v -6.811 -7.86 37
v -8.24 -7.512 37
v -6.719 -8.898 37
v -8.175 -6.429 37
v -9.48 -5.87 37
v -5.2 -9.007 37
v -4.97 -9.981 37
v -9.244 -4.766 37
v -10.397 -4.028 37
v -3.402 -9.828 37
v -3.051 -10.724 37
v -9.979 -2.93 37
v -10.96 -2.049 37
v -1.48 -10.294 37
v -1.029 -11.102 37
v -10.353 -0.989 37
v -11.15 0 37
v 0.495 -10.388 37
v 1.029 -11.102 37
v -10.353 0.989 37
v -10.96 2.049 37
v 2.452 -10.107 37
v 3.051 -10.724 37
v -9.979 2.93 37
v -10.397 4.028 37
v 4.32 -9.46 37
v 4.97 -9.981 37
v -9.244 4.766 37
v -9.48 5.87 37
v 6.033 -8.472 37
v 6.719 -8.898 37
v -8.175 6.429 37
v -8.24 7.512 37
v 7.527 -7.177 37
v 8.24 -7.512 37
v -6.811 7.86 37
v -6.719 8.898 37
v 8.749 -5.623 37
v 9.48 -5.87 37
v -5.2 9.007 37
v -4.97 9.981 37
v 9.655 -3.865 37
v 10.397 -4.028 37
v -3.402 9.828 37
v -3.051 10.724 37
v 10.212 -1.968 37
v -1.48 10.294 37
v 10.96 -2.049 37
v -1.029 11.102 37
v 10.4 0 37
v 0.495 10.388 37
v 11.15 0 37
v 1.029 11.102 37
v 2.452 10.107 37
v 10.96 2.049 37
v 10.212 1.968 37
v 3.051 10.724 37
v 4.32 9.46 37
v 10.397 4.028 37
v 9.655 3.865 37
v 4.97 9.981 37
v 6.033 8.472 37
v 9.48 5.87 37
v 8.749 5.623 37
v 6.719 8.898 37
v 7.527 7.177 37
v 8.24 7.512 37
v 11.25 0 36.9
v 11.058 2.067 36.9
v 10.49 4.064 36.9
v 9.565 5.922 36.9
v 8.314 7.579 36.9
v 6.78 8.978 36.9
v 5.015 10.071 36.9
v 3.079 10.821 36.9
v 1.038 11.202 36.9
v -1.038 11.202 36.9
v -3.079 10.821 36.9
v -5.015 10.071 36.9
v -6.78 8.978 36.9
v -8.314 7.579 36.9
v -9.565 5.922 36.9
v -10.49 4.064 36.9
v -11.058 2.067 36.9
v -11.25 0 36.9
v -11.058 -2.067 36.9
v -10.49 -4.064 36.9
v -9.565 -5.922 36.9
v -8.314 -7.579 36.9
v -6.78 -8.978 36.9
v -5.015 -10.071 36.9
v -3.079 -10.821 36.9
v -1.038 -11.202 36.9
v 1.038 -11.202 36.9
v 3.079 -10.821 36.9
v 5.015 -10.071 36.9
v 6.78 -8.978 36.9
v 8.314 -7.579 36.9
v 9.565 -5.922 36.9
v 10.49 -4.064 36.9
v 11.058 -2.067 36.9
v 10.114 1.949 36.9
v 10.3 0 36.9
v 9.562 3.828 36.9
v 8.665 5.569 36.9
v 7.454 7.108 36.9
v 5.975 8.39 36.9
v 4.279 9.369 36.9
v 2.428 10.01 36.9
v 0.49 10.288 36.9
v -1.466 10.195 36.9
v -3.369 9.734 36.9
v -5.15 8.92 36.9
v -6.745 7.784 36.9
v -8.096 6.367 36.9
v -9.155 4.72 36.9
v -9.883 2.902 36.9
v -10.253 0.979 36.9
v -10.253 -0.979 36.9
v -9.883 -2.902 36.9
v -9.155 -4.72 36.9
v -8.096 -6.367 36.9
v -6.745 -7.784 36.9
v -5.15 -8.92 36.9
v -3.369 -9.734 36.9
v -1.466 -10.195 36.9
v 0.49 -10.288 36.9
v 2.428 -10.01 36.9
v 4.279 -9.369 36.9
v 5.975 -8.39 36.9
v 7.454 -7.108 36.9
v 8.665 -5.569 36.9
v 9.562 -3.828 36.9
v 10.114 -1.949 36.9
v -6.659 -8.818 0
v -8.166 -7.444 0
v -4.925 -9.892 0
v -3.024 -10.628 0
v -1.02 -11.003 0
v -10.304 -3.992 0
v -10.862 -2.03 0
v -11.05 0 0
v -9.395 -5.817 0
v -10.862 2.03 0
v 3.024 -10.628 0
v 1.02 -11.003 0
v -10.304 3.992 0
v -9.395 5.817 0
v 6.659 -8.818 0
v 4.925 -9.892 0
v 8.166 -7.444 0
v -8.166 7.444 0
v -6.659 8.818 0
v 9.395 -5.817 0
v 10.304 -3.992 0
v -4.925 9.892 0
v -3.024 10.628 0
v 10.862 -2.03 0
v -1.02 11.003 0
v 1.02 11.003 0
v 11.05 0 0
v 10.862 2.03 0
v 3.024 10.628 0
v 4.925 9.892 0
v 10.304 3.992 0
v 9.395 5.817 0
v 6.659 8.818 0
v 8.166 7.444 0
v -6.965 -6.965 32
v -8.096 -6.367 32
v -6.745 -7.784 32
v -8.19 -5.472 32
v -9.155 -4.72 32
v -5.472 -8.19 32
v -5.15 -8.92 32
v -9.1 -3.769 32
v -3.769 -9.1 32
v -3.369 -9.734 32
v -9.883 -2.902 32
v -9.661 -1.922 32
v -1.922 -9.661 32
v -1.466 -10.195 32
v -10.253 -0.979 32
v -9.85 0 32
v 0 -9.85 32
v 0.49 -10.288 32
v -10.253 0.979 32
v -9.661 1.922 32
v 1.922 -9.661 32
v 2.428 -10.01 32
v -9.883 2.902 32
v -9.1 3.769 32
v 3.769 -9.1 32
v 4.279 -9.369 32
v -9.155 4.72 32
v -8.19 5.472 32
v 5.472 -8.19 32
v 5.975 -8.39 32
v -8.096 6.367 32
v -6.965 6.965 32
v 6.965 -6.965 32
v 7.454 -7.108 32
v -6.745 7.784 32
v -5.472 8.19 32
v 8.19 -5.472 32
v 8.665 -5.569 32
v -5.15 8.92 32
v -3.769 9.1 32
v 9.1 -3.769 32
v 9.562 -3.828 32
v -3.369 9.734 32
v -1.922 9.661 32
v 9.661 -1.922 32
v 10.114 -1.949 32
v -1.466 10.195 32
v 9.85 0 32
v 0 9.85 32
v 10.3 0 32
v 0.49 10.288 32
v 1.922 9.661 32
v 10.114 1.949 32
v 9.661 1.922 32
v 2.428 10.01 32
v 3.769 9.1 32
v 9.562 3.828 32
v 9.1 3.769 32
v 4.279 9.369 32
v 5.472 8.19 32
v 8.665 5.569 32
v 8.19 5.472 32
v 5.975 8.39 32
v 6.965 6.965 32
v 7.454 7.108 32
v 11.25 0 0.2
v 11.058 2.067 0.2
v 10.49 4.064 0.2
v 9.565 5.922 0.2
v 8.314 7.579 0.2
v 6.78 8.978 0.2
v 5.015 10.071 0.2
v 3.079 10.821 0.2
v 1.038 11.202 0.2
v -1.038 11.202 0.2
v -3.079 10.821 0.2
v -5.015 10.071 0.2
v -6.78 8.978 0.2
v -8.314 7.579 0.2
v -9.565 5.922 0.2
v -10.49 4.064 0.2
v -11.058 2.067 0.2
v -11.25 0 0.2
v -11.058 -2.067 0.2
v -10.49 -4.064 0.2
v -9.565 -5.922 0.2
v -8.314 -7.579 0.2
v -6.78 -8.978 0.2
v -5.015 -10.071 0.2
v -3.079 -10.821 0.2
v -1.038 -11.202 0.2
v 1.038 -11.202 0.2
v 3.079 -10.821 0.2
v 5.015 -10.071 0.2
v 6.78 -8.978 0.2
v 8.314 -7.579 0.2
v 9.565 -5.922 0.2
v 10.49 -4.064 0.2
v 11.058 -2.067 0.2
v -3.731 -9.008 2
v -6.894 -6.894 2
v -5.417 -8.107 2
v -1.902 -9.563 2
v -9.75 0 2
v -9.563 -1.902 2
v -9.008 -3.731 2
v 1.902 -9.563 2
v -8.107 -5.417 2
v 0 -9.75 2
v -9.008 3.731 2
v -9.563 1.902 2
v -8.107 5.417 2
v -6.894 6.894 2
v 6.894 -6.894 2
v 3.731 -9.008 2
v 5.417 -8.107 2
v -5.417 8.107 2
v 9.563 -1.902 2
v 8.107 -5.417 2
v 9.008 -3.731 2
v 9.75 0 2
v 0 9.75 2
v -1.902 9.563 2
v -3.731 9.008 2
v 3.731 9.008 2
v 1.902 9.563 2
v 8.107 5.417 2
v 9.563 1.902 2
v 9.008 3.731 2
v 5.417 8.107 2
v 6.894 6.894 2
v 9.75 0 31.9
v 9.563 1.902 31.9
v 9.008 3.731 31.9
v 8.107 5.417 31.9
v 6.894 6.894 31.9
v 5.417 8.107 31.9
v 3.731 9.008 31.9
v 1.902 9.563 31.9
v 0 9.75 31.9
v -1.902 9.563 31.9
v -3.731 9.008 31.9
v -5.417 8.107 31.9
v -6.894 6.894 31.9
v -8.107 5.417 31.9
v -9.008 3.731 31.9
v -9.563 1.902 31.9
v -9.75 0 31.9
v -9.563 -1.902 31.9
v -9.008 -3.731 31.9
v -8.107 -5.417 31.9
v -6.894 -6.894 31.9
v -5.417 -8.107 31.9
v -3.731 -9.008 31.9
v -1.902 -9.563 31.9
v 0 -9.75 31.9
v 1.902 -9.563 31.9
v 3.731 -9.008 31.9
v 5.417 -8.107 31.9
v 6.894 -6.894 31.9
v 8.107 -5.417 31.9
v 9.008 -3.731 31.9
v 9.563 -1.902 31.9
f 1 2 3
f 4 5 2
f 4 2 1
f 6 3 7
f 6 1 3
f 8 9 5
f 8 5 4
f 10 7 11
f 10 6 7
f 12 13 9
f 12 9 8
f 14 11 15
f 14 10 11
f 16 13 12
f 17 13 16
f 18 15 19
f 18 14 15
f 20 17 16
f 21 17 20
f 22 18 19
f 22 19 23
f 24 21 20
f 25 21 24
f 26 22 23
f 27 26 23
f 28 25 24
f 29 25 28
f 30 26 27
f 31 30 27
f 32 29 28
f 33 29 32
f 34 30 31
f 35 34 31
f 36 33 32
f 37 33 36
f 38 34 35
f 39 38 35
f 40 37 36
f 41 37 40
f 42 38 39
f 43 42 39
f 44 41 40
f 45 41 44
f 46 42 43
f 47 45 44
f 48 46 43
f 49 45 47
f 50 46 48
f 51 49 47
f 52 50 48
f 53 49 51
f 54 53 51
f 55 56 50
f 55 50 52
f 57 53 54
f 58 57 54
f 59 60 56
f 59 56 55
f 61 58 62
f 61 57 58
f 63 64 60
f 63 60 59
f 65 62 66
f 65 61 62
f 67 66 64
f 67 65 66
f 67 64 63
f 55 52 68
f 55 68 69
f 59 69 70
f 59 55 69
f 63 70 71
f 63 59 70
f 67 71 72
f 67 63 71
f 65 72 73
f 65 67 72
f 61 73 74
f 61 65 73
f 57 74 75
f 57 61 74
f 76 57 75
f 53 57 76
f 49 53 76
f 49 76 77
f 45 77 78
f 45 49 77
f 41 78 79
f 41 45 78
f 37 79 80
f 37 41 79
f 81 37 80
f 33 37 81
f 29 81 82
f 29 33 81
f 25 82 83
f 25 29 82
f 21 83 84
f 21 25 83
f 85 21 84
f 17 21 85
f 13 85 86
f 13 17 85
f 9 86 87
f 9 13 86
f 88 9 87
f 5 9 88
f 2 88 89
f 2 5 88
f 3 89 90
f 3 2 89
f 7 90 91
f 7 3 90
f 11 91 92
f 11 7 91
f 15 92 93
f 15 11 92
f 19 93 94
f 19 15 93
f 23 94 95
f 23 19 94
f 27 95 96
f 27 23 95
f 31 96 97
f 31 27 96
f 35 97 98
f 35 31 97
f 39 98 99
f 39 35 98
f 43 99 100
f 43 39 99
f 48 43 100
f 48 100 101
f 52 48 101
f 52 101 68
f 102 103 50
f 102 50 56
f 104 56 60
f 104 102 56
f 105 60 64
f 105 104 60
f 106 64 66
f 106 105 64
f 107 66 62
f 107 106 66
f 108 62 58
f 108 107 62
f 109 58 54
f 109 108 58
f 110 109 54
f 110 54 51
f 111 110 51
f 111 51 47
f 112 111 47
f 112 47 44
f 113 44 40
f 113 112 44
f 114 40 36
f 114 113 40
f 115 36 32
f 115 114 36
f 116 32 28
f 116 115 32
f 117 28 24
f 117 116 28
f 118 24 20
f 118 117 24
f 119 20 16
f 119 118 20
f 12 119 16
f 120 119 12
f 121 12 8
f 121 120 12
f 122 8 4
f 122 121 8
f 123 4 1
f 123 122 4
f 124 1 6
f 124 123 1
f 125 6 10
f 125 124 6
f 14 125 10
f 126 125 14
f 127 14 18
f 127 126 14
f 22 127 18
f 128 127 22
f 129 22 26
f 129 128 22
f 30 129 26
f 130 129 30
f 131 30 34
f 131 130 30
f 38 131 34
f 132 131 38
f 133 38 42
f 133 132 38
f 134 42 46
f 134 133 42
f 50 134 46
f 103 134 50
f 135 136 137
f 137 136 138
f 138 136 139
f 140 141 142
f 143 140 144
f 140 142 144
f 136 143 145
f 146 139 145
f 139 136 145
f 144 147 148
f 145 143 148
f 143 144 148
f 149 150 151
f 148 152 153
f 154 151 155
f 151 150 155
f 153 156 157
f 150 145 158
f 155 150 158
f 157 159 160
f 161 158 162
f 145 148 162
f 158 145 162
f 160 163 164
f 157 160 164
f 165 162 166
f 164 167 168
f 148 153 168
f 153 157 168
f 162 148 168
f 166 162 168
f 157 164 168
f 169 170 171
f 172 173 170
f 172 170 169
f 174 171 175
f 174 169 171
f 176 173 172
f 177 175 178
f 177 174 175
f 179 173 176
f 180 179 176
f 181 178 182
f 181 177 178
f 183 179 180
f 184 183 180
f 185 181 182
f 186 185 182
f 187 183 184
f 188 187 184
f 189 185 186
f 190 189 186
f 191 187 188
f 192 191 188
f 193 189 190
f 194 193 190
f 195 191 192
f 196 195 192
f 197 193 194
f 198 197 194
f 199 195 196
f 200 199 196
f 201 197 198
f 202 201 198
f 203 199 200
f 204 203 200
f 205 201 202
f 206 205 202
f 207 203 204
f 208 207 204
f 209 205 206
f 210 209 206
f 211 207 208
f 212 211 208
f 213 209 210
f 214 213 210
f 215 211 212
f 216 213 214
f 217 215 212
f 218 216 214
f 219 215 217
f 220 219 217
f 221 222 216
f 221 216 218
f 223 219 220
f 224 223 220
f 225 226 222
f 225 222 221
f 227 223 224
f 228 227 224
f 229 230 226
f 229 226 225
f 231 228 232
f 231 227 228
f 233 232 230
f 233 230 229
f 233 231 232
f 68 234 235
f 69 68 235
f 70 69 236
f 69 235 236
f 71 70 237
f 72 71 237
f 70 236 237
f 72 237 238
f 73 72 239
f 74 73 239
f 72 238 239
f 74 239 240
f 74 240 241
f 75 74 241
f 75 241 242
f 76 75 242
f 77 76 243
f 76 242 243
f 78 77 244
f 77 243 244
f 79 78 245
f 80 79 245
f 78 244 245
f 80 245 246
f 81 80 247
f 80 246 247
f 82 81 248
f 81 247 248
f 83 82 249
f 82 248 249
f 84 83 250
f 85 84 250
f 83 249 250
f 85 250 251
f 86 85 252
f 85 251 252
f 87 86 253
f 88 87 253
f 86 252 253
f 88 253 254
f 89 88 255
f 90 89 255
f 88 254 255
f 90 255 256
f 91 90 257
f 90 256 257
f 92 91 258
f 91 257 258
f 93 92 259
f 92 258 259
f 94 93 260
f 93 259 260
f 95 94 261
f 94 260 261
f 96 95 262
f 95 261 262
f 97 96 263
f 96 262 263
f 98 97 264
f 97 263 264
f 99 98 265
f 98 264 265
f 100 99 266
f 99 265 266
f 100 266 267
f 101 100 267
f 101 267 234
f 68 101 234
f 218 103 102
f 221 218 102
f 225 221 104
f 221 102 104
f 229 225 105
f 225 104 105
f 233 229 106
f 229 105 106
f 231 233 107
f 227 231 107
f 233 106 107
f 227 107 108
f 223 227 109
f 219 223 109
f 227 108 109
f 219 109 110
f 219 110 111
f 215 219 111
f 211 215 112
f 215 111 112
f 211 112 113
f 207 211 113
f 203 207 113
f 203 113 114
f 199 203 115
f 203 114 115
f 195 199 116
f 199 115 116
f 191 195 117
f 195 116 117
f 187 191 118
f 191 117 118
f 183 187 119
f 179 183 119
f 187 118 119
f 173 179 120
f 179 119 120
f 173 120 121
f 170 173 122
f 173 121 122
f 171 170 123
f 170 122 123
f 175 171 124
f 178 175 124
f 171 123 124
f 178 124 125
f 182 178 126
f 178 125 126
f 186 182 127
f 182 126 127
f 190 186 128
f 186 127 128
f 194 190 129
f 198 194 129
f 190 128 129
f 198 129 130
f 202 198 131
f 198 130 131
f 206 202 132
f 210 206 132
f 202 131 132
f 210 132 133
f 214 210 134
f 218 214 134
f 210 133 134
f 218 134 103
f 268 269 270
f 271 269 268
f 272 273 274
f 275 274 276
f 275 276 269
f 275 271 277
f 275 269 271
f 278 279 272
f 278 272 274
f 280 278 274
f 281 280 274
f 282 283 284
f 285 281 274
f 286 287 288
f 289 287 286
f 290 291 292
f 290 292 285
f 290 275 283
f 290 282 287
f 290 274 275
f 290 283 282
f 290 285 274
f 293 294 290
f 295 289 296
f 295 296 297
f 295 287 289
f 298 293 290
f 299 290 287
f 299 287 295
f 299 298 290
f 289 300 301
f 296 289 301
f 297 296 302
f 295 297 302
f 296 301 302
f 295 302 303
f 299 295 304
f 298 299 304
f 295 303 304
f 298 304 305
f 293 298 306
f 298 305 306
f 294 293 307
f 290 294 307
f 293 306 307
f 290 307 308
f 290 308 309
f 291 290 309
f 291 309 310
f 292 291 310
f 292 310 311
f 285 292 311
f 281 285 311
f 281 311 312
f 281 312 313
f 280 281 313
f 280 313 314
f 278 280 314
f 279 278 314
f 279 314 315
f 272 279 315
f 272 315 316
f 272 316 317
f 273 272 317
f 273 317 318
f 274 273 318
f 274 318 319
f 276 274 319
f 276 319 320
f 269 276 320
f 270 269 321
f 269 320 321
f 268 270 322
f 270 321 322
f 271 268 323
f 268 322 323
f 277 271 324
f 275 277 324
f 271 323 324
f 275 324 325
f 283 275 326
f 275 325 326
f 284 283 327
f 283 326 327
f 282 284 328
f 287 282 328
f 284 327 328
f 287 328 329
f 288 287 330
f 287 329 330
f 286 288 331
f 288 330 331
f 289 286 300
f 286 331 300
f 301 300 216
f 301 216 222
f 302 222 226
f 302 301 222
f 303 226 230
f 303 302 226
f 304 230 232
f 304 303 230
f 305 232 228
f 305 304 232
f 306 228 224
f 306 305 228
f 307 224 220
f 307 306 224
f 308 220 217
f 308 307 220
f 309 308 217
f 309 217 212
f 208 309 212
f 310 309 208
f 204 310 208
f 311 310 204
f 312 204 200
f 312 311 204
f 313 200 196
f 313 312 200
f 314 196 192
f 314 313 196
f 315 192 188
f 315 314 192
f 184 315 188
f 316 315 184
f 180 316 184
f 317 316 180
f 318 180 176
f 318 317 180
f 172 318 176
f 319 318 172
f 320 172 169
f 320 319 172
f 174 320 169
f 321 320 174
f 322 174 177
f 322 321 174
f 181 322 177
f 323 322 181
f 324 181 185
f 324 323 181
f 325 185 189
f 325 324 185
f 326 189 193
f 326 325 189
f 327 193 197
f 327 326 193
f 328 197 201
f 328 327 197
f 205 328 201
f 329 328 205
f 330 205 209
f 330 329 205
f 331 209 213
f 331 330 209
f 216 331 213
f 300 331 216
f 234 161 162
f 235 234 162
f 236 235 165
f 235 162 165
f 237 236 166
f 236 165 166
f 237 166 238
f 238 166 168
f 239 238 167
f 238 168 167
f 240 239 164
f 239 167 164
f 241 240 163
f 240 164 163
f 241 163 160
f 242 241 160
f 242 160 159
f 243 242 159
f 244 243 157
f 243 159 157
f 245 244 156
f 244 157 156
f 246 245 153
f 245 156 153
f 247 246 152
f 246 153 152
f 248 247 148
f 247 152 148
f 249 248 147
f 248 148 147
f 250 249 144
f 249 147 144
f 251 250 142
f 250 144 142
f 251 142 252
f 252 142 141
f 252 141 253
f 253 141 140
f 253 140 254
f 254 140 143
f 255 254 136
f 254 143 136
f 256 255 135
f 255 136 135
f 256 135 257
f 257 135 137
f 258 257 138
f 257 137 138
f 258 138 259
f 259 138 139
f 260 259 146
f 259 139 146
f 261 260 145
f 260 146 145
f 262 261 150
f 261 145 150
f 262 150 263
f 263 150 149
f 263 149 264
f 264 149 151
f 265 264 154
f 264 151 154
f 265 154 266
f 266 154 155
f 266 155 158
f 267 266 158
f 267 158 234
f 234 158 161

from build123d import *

# Parameters (mm, degrees)
F0_R     = 11.25
F1_DEPTH = 37
F2_R     = 9.75
F3_DEPTH = 35
F4_R     = 10.3
F5_DEPTH = 5
F6_SIZE  = 0.1
F7_SIZE  = 0.2


with BuildPart() as f1:
    # F0 (on Top) → F1 (new body)
    with BuildSketch(Plane.XY):
        Circle(F0_R)
    extrude(amount=F1_DEPTH)

    # F2 (on face) → F3 (cut)
    with BuildSketch(Plane.XY.offset(37)):
        Circle(F2_R)
    extrude(amount=-F3_DEPTH, mode=Mode.SUBTRACT)

    # F4 (on face) → F5 (cut)
    with BuildSketch(Plane.XY.offset(37)):
        Circle(F4_R)
    extrude(amount=-F5_DEPTH, mode=Mode.SUBTRACT)

    # F6
    f6_edges = [f1.edges().sort_by_distance(p)[0] for p in [
        (-10.3, 0, 37),
        (-11.25, 0, 37),
        (-9.75, 0, 32),
    ]]
    chamfer(f6_edges, length=F6_SIZE)

    # F7
    f7_edges = [f1.edges().sort_by_distance(p)[0] for p in [
        (-11.25, 0, 0),
    ]]
    chamfer(f7_edges, length=F7_SIZE)


solid = f1.part
